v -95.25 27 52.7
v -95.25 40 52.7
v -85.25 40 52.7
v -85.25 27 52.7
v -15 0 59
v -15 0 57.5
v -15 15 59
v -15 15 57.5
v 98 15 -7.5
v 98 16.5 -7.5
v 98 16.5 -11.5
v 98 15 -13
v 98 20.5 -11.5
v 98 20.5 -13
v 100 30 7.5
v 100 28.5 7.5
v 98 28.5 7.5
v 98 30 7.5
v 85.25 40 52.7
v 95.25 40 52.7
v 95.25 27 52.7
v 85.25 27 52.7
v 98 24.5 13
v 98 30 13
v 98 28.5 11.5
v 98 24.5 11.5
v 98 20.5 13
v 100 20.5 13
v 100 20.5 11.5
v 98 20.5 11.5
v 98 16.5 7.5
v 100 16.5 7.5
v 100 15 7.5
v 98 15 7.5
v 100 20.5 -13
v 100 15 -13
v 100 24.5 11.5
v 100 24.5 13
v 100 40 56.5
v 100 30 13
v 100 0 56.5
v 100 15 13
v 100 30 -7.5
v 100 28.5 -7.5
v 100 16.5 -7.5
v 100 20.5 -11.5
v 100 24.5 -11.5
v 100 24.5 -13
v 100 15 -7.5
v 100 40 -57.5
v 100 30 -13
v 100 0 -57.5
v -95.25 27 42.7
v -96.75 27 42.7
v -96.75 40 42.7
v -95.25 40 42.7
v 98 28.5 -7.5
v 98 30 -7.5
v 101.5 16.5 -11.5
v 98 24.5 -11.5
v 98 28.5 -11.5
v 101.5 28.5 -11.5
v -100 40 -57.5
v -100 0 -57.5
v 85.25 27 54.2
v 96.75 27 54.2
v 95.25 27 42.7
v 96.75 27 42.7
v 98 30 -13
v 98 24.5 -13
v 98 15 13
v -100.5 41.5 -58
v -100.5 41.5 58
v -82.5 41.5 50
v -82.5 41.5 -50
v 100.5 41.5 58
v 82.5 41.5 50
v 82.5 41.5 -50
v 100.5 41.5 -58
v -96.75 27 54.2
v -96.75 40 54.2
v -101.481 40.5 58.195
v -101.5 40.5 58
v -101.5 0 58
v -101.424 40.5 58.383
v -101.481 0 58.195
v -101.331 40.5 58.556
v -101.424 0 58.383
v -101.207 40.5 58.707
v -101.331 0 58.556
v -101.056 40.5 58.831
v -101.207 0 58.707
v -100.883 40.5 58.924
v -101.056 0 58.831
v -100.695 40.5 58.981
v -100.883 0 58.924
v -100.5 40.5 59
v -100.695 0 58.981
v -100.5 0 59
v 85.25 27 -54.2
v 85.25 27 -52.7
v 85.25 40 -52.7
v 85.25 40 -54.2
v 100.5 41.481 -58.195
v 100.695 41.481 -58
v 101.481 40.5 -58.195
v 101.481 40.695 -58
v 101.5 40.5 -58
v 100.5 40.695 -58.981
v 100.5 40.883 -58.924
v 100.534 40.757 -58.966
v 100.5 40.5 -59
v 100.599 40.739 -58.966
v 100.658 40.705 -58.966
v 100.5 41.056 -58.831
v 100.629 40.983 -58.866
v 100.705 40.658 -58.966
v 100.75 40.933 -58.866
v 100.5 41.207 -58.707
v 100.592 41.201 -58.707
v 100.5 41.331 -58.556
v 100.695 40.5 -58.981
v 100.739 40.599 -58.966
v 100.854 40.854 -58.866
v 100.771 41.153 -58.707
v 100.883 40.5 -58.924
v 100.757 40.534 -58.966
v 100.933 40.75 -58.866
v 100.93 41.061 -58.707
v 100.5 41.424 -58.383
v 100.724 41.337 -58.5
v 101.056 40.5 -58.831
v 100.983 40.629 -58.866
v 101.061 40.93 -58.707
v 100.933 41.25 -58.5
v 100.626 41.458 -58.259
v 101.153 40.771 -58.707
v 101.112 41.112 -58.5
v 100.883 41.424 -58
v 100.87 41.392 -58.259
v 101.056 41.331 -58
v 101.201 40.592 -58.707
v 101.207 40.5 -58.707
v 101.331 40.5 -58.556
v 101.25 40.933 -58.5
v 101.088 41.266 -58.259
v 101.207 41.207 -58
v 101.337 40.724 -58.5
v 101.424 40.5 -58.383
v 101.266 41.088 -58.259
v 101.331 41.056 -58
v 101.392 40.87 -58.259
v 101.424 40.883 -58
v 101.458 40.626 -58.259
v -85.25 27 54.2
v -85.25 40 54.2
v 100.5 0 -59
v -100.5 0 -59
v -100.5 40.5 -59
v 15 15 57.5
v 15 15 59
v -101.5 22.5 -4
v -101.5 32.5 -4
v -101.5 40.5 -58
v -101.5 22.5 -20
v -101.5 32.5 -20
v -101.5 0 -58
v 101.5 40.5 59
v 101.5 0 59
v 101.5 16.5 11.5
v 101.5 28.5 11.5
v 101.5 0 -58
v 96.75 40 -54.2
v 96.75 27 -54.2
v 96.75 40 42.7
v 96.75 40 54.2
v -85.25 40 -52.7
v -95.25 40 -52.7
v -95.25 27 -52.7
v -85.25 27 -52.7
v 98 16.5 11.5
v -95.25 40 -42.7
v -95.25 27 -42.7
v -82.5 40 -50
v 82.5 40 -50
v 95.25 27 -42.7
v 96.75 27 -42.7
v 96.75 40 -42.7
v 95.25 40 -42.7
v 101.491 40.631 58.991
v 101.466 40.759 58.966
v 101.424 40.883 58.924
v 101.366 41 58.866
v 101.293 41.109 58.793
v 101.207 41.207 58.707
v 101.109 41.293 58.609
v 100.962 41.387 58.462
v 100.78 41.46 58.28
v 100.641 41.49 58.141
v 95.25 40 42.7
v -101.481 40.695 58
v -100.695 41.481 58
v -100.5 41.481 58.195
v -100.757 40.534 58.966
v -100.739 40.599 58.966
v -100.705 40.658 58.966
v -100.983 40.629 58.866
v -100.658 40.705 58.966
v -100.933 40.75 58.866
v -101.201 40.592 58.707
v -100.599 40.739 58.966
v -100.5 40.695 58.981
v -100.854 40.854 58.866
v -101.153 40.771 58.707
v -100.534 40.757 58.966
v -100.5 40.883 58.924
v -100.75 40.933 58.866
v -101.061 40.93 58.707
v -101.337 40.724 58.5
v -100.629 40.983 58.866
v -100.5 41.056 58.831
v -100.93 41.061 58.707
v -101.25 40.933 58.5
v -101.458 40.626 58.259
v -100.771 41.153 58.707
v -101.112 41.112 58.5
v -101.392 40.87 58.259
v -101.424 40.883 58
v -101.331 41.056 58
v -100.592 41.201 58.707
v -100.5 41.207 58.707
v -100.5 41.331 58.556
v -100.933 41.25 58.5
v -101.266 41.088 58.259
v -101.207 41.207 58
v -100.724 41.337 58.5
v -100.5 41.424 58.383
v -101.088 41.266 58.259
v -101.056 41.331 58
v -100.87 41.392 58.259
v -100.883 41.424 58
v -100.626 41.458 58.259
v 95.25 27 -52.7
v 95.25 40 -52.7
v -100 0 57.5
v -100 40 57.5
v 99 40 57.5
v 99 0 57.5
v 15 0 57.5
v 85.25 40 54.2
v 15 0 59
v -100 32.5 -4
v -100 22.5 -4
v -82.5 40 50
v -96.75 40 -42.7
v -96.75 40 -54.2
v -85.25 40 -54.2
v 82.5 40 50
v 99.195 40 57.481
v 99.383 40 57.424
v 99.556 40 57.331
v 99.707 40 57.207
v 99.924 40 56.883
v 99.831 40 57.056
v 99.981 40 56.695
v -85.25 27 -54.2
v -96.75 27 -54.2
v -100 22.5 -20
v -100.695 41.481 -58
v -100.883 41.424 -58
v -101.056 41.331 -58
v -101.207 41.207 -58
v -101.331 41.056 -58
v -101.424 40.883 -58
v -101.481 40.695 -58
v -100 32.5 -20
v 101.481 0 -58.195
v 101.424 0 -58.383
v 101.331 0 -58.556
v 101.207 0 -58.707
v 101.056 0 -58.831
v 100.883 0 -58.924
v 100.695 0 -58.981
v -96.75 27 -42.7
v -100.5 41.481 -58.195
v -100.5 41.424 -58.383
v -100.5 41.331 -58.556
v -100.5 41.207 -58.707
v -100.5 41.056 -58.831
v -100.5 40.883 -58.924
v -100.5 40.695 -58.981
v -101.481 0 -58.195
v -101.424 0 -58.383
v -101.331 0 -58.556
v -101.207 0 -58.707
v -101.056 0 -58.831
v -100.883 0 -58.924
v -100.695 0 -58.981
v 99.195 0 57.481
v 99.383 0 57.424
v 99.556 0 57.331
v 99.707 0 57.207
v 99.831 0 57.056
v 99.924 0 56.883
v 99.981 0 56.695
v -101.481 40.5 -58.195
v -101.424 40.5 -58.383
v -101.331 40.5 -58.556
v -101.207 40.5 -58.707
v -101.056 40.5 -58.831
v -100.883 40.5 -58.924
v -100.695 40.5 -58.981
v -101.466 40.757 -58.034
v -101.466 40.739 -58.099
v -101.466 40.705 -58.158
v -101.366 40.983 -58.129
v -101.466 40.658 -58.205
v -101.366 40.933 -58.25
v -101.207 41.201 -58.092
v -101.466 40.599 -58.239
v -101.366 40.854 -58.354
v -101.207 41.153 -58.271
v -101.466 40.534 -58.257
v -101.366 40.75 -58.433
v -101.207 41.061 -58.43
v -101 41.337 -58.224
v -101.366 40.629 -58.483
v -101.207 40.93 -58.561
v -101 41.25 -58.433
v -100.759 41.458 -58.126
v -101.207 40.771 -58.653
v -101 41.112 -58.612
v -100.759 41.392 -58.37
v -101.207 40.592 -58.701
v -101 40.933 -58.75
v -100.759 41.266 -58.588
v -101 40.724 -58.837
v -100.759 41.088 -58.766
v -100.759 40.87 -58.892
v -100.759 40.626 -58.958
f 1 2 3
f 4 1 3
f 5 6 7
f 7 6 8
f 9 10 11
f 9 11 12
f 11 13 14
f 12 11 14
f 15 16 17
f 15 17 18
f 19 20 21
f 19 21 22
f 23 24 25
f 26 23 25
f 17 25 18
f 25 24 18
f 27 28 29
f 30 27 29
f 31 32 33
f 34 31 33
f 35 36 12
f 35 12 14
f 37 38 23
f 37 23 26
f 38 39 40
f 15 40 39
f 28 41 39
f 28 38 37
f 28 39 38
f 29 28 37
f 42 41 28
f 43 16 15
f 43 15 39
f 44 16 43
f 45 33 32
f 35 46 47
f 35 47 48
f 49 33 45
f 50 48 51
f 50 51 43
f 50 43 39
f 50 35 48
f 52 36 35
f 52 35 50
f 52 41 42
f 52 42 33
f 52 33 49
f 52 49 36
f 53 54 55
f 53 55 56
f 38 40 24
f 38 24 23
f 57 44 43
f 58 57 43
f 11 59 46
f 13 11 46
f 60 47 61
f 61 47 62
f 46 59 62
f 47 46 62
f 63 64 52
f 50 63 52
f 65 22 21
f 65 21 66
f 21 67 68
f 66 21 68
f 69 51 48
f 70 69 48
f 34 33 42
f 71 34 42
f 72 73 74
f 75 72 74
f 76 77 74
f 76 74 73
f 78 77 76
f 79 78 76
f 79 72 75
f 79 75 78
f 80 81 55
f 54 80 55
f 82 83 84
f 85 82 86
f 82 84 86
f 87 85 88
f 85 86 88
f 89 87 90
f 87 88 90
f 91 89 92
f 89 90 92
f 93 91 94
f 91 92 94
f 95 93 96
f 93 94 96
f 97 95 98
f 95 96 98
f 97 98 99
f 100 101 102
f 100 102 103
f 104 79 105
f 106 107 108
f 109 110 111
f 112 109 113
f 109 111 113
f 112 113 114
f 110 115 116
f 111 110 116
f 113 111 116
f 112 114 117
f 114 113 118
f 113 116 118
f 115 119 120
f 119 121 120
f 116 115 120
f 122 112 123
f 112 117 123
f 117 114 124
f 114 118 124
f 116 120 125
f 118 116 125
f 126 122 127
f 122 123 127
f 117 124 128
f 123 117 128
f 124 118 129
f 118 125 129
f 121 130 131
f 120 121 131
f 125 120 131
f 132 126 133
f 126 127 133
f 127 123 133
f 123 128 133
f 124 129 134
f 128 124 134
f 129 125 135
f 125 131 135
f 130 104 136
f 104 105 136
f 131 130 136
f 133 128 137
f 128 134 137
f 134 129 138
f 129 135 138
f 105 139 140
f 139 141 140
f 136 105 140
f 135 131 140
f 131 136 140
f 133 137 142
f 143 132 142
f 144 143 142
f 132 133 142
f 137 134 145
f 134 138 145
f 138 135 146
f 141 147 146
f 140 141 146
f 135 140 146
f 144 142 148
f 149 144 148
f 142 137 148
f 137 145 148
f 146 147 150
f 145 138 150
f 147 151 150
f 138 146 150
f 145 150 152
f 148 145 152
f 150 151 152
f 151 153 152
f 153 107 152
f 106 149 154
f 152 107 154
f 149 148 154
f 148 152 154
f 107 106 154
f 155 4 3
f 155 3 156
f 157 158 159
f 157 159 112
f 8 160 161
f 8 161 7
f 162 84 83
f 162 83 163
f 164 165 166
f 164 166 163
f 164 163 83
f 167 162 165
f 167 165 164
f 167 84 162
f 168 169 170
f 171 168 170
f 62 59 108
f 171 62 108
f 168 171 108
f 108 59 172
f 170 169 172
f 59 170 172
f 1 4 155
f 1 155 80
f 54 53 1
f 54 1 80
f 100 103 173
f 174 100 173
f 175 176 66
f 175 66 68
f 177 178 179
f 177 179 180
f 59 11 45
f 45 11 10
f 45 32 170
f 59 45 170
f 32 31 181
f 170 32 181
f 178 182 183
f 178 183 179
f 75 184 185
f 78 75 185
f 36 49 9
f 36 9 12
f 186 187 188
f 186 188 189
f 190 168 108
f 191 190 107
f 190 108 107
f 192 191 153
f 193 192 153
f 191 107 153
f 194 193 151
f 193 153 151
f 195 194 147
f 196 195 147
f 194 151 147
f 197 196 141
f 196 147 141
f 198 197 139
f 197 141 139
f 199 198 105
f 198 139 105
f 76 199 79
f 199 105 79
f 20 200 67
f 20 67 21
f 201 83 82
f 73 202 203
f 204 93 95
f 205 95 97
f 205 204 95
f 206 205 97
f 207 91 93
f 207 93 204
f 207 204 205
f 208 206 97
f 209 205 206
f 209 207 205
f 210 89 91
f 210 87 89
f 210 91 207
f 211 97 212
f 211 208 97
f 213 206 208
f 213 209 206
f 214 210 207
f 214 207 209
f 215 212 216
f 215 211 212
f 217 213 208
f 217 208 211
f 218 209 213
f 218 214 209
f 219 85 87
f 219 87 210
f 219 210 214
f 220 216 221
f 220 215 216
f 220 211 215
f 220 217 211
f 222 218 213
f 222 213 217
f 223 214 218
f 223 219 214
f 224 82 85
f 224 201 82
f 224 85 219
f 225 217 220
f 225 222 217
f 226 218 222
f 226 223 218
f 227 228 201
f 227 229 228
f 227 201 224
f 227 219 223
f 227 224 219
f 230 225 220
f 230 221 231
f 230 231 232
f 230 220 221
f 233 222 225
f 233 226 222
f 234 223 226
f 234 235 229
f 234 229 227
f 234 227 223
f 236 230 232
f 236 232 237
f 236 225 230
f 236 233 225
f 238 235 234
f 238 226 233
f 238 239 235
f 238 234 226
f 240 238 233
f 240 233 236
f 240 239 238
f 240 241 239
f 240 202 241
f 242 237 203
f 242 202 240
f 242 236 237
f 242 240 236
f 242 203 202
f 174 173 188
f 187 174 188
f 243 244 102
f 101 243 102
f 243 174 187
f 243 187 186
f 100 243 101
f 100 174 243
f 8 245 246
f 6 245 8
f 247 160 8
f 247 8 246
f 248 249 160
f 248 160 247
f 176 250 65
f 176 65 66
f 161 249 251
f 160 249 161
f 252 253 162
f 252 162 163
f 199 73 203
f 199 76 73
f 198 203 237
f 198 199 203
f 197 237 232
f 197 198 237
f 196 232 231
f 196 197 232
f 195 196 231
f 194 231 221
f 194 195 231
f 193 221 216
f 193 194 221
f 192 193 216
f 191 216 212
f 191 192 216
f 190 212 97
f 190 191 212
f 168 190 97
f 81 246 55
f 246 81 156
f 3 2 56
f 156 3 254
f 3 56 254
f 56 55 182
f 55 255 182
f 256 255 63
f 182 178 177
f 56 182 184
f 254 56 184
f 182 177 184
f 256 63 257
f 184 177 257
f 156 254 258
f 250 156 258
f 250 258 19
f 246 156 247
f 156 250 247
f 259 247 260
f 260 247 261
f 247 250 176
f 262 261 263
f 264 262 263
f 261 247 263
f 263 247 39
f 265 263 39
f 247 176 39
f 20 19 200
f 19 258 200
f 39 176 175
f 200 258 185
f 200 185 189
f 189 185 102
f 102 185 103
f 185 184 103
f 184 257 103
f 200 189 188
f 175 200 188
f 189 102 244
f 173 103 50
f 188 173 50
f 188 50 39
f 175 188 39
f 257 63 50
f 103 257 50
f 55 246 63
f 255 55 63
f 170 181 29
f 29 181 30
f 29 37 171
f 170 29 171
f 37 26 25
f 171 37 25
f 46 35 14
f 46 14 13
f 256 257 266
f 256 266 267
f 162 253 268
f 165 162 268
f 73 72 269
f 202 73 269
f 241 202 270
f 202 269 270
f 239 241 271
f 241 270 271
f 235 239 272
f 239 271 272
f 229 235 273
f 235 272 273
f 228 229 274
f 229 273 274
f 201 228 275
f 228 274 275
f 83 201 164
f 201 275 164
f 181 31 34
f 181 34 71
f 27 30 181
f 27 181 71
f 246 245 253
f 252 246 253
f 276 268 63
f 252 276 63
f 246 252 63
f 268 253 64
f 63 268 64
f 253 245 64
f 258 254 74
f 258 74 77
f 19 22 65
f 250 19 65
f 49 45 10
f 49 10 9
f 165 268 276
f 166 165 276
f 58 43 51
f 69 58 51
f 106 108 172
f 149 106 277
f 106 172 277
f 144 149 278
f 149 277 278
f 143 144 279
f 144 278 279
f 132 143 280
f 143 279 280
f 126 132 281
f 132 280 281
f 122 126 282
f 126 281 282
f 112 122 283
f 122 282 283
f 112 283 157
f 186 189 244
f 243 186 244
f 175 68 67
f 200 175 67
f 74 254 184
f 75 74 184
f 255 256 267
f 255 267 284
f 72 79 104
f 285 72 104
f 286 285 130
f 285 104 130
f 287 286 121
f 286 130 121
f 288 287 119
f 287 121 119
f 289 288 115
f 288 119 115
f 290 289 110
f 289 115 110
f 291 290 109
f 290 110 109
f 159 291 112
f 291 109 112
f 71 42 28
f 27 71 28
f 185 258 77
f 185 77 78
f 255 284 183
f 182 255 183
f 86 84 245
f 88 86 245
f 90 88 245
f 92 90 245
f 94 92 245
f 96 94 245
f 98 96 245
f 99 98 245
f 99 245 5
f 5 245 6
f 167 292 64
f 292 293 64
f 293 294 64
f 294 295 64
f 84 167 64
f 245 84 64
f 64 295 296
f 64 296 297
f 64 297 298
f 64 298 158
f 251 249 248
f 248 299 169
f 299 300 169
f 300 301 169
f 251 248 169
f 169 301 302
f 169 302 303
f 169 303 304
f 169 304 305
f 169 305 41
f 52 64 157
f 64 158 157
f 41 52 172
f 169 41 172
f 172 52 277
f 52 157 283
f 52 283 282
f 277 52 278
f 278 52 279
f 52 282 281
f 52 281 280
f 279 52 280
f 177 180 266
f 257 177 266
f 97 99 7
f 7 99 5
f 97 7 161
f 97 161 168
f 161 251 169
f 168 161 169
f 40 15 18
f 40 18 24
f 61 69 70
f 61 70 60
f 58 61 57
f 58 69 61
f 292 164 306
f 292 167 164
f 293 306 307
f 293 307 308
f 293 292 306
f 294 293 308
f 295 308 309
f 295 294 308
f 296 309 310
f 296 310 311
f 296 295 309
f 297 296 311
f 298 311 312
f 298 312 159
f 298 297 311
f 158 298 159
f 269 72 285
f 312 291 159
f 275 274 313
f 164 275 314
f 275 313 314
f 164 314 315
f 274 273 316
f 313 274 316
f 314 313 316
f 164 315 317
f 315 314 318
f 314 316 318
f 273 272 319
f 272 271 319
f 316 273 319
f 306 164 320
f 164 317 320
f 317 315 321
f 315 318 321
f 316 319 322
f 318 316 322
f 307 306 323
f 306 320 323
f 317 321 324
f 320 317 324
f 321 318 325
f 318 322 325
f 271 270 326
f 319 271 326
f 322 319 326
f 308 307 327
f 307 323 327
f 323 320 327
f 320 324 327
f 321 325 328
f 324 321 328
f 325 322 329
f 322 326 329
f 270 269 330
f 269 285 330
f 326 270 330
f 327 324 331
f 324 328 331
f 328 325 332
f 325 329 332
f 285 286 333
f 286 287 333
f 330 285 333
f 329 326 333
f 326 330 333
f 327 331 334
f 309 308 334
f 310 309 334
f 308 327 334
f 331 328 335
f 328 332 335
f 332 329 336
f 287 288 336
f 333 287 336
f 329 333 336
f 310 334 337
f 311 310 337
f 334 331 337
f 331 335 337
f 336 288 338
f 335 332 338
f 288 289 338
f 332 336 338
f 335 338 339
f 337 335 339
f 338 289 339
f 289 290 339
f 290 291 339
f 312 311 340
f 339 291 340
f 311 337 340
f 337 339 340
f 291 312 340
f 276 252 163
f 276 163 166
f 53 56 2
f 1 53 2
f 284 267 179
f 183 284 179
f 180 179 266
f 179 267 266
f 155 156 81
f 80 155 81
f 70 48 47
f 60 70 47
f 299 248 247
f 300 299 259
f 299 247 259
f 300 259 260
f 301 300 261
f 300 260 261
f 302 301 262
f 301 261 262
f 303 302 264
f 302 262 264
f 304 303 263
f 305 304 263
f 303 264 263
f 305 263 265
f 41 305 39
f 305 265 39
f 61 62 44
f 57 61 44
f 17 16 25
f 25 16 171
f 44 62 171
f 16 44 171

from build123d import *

# Parameters (mm, degrees)
SKETCH_1_W           = 200
SKETCH_1_H           = 115
F_40MM_DEPTH         = 40
SHELL_3_T            = 1.5
SKETCH_2_W           = 165
SKETCH_2_H           = 100
CUT_EXTRUDE_7_DEPTH  = 1.5
SKETCH_3_W           = 16
SKETCH_3_H           = 10
CUT_EXTRUDE_8_DEPTH  = 1.5
SKETCH_4_W           = 23
SKETCH_4_H           = 12
CUT_EXTRUDE_9_DEPTH  = 1.5
EXTRUDE_1_DEPTH      = 13
EXTRUDE_2_DEPTH      = 2
FILLET_2_R           = 1
SKETCH_9_W           = 30
SKETCH_9_H           = 30
CUT_EXTRUDE_10_DEPTH = 10


with BuildPart() as part:
    # 草图1 → 凸台-拉伸40mm (new body)
    with BuildSketch(Plane(origin=(0, 0, 0), x_dir=(1, 0, 0), z_dir=(0, 1, 0))):
        Rectangle(SKETCH_1_W, SKETCH_1_H)
    extrude(amount=F_40MM_DEPTH)

    # 抽壳3
    shell_3_openings = [part.faces().sort_by_distance(p)[0] for p in [
        (0, 0, 0),
    ]]
    offset(amount=SHELL_3_T, openings=shell_3_openings, kind=Kind.INTERSECTION)

    # 草图2 → 切除-拉伸7 (cut)
    with BuildSketch(Plane(origin=(0, 40, 0), x_dir=(1, 0, 0), z_dir=(0, 1, 0))):
        Rectangle(SKETCH_2_W, SKETCH_2_H)
    extrude(amount=CUT_EXTRUDE_7_DEPTH, mode=Mode.SUBTRACT)

    # 草图3 → 切除-拉伸8 (cut)
    with BuildSketch(Plane(origin=(-100, 0, 0), x_dir=(0, 0, -1), z_dir=(1, 0, 0))):
        with Locations((12, 27.5)):
            Rectangle(SKETCH_3_W, SKETCH_3_H)
    extrude(amount=-CUT_EXTRUDE_8_DEPTH, mode=Mode.SUBTRACT)

    # 草图4 → 切除-拉伸9 (cut)
    with BuildSketch(Plane.ZY.offset(-100)):
        with Locations((0, 22.5)):
            Rectangle(SKETCH_4_W, SKETCH_4_H)
    extrude(amount=-CUT_EXTRUDE_9_DEPTH, mode=Mode.SUBTRACT)

    # 草图6 → 凸台-拉伸1 (add)
    with BuildSketch(Plane(origin=(0, 40, 0), x_dir=(-1, 0, 0), z_dir=(0, -1, 0))):
        Polygon((-95.25, 52.7), (-85.25, 52.7), (-85.25, 54.2), (-96.75, 54.2), (-96.75, 42.7), (-95.25, 42.7), align=None)
        Polygon((-96.75, -42.7), (-95.25, -42.7), (-95.25, -52.7), (-85.25, -52.7), (-85.25, -54.2), (-96.75, -54.2), align=None)
        Polygon((85.25, -52.7), (85.25, -54.2), (96.75, -54.2), (96.75, -42.7), (95.25, -42.7), (95.25, -52.7), align=None)
        Polygon((85.25, 52.7), (85.25, 54.2), (96.75, 54.2), (96.75, 42.7), (95.25, 42.7), (95.25, 52.7), align=None)
    extrude(amount=EXTRUDE_1_DEPTH)

    # 草图7 → 凸台-拉伸2 (add)
    with BuildSketch(Plane.ZY.offset(-100)):
        Polygon((-7.5, 28.5), (-7.5, 30), (-13, 30), (-13, 24.5), (-11.5, 24.5), (-11.5, 28.5), align=None)
        Polygon((7.5, 28.5), (7.5, 30), (13, 30), (13, 24.5), (11.5, 24.5), (11.5, 28.5), align=None)
        Polygon((7.5, 16.5), (7.5, 15), (13, 15), (13, 20.5), (11.5, 20.5), (11.5, 16.5), align=None)
        Polygon((-13, 20.5), (-11.5, 20.5), (-11.5, 16.5), (-7.5, 16.5), (-7.5, 15), (-13, 15), align=None)
    extrude(amount=EXTRUDE_2_DEPTH)

    # 圆角2
    fillet_2_edges = [part.edges().sort_by_distance(p)[0] for p in [
        (101.5, 41.5, 0),
        (0, 41.5, -59),
        (100, 20, 57.5),
        (-101.5, 41.5, 0),
        (-101.5, 20.75, -59),
        (101.5, 20.75, -59),
        (-101.5, 20.75, 59),
        (0, 41.5, 59),
    ]]
    fillet(fillet_2_edges, radius=FILLET_2_R)

    # 草图9 → 切除-拉伸10 (cut)
    with BuildSketch(Plane(origin=(0, 0, 57.5), x_dir=(-1, 0, 0), z_dir=(0, 0, -1))):
        Rectangle(SKETCH_9_W, SKETCH_9_H)
    extrude(amount=-CUT_EXTRUDE_10_DEPTH, mode=Mode.SUBTRACT)


solid = part.part
